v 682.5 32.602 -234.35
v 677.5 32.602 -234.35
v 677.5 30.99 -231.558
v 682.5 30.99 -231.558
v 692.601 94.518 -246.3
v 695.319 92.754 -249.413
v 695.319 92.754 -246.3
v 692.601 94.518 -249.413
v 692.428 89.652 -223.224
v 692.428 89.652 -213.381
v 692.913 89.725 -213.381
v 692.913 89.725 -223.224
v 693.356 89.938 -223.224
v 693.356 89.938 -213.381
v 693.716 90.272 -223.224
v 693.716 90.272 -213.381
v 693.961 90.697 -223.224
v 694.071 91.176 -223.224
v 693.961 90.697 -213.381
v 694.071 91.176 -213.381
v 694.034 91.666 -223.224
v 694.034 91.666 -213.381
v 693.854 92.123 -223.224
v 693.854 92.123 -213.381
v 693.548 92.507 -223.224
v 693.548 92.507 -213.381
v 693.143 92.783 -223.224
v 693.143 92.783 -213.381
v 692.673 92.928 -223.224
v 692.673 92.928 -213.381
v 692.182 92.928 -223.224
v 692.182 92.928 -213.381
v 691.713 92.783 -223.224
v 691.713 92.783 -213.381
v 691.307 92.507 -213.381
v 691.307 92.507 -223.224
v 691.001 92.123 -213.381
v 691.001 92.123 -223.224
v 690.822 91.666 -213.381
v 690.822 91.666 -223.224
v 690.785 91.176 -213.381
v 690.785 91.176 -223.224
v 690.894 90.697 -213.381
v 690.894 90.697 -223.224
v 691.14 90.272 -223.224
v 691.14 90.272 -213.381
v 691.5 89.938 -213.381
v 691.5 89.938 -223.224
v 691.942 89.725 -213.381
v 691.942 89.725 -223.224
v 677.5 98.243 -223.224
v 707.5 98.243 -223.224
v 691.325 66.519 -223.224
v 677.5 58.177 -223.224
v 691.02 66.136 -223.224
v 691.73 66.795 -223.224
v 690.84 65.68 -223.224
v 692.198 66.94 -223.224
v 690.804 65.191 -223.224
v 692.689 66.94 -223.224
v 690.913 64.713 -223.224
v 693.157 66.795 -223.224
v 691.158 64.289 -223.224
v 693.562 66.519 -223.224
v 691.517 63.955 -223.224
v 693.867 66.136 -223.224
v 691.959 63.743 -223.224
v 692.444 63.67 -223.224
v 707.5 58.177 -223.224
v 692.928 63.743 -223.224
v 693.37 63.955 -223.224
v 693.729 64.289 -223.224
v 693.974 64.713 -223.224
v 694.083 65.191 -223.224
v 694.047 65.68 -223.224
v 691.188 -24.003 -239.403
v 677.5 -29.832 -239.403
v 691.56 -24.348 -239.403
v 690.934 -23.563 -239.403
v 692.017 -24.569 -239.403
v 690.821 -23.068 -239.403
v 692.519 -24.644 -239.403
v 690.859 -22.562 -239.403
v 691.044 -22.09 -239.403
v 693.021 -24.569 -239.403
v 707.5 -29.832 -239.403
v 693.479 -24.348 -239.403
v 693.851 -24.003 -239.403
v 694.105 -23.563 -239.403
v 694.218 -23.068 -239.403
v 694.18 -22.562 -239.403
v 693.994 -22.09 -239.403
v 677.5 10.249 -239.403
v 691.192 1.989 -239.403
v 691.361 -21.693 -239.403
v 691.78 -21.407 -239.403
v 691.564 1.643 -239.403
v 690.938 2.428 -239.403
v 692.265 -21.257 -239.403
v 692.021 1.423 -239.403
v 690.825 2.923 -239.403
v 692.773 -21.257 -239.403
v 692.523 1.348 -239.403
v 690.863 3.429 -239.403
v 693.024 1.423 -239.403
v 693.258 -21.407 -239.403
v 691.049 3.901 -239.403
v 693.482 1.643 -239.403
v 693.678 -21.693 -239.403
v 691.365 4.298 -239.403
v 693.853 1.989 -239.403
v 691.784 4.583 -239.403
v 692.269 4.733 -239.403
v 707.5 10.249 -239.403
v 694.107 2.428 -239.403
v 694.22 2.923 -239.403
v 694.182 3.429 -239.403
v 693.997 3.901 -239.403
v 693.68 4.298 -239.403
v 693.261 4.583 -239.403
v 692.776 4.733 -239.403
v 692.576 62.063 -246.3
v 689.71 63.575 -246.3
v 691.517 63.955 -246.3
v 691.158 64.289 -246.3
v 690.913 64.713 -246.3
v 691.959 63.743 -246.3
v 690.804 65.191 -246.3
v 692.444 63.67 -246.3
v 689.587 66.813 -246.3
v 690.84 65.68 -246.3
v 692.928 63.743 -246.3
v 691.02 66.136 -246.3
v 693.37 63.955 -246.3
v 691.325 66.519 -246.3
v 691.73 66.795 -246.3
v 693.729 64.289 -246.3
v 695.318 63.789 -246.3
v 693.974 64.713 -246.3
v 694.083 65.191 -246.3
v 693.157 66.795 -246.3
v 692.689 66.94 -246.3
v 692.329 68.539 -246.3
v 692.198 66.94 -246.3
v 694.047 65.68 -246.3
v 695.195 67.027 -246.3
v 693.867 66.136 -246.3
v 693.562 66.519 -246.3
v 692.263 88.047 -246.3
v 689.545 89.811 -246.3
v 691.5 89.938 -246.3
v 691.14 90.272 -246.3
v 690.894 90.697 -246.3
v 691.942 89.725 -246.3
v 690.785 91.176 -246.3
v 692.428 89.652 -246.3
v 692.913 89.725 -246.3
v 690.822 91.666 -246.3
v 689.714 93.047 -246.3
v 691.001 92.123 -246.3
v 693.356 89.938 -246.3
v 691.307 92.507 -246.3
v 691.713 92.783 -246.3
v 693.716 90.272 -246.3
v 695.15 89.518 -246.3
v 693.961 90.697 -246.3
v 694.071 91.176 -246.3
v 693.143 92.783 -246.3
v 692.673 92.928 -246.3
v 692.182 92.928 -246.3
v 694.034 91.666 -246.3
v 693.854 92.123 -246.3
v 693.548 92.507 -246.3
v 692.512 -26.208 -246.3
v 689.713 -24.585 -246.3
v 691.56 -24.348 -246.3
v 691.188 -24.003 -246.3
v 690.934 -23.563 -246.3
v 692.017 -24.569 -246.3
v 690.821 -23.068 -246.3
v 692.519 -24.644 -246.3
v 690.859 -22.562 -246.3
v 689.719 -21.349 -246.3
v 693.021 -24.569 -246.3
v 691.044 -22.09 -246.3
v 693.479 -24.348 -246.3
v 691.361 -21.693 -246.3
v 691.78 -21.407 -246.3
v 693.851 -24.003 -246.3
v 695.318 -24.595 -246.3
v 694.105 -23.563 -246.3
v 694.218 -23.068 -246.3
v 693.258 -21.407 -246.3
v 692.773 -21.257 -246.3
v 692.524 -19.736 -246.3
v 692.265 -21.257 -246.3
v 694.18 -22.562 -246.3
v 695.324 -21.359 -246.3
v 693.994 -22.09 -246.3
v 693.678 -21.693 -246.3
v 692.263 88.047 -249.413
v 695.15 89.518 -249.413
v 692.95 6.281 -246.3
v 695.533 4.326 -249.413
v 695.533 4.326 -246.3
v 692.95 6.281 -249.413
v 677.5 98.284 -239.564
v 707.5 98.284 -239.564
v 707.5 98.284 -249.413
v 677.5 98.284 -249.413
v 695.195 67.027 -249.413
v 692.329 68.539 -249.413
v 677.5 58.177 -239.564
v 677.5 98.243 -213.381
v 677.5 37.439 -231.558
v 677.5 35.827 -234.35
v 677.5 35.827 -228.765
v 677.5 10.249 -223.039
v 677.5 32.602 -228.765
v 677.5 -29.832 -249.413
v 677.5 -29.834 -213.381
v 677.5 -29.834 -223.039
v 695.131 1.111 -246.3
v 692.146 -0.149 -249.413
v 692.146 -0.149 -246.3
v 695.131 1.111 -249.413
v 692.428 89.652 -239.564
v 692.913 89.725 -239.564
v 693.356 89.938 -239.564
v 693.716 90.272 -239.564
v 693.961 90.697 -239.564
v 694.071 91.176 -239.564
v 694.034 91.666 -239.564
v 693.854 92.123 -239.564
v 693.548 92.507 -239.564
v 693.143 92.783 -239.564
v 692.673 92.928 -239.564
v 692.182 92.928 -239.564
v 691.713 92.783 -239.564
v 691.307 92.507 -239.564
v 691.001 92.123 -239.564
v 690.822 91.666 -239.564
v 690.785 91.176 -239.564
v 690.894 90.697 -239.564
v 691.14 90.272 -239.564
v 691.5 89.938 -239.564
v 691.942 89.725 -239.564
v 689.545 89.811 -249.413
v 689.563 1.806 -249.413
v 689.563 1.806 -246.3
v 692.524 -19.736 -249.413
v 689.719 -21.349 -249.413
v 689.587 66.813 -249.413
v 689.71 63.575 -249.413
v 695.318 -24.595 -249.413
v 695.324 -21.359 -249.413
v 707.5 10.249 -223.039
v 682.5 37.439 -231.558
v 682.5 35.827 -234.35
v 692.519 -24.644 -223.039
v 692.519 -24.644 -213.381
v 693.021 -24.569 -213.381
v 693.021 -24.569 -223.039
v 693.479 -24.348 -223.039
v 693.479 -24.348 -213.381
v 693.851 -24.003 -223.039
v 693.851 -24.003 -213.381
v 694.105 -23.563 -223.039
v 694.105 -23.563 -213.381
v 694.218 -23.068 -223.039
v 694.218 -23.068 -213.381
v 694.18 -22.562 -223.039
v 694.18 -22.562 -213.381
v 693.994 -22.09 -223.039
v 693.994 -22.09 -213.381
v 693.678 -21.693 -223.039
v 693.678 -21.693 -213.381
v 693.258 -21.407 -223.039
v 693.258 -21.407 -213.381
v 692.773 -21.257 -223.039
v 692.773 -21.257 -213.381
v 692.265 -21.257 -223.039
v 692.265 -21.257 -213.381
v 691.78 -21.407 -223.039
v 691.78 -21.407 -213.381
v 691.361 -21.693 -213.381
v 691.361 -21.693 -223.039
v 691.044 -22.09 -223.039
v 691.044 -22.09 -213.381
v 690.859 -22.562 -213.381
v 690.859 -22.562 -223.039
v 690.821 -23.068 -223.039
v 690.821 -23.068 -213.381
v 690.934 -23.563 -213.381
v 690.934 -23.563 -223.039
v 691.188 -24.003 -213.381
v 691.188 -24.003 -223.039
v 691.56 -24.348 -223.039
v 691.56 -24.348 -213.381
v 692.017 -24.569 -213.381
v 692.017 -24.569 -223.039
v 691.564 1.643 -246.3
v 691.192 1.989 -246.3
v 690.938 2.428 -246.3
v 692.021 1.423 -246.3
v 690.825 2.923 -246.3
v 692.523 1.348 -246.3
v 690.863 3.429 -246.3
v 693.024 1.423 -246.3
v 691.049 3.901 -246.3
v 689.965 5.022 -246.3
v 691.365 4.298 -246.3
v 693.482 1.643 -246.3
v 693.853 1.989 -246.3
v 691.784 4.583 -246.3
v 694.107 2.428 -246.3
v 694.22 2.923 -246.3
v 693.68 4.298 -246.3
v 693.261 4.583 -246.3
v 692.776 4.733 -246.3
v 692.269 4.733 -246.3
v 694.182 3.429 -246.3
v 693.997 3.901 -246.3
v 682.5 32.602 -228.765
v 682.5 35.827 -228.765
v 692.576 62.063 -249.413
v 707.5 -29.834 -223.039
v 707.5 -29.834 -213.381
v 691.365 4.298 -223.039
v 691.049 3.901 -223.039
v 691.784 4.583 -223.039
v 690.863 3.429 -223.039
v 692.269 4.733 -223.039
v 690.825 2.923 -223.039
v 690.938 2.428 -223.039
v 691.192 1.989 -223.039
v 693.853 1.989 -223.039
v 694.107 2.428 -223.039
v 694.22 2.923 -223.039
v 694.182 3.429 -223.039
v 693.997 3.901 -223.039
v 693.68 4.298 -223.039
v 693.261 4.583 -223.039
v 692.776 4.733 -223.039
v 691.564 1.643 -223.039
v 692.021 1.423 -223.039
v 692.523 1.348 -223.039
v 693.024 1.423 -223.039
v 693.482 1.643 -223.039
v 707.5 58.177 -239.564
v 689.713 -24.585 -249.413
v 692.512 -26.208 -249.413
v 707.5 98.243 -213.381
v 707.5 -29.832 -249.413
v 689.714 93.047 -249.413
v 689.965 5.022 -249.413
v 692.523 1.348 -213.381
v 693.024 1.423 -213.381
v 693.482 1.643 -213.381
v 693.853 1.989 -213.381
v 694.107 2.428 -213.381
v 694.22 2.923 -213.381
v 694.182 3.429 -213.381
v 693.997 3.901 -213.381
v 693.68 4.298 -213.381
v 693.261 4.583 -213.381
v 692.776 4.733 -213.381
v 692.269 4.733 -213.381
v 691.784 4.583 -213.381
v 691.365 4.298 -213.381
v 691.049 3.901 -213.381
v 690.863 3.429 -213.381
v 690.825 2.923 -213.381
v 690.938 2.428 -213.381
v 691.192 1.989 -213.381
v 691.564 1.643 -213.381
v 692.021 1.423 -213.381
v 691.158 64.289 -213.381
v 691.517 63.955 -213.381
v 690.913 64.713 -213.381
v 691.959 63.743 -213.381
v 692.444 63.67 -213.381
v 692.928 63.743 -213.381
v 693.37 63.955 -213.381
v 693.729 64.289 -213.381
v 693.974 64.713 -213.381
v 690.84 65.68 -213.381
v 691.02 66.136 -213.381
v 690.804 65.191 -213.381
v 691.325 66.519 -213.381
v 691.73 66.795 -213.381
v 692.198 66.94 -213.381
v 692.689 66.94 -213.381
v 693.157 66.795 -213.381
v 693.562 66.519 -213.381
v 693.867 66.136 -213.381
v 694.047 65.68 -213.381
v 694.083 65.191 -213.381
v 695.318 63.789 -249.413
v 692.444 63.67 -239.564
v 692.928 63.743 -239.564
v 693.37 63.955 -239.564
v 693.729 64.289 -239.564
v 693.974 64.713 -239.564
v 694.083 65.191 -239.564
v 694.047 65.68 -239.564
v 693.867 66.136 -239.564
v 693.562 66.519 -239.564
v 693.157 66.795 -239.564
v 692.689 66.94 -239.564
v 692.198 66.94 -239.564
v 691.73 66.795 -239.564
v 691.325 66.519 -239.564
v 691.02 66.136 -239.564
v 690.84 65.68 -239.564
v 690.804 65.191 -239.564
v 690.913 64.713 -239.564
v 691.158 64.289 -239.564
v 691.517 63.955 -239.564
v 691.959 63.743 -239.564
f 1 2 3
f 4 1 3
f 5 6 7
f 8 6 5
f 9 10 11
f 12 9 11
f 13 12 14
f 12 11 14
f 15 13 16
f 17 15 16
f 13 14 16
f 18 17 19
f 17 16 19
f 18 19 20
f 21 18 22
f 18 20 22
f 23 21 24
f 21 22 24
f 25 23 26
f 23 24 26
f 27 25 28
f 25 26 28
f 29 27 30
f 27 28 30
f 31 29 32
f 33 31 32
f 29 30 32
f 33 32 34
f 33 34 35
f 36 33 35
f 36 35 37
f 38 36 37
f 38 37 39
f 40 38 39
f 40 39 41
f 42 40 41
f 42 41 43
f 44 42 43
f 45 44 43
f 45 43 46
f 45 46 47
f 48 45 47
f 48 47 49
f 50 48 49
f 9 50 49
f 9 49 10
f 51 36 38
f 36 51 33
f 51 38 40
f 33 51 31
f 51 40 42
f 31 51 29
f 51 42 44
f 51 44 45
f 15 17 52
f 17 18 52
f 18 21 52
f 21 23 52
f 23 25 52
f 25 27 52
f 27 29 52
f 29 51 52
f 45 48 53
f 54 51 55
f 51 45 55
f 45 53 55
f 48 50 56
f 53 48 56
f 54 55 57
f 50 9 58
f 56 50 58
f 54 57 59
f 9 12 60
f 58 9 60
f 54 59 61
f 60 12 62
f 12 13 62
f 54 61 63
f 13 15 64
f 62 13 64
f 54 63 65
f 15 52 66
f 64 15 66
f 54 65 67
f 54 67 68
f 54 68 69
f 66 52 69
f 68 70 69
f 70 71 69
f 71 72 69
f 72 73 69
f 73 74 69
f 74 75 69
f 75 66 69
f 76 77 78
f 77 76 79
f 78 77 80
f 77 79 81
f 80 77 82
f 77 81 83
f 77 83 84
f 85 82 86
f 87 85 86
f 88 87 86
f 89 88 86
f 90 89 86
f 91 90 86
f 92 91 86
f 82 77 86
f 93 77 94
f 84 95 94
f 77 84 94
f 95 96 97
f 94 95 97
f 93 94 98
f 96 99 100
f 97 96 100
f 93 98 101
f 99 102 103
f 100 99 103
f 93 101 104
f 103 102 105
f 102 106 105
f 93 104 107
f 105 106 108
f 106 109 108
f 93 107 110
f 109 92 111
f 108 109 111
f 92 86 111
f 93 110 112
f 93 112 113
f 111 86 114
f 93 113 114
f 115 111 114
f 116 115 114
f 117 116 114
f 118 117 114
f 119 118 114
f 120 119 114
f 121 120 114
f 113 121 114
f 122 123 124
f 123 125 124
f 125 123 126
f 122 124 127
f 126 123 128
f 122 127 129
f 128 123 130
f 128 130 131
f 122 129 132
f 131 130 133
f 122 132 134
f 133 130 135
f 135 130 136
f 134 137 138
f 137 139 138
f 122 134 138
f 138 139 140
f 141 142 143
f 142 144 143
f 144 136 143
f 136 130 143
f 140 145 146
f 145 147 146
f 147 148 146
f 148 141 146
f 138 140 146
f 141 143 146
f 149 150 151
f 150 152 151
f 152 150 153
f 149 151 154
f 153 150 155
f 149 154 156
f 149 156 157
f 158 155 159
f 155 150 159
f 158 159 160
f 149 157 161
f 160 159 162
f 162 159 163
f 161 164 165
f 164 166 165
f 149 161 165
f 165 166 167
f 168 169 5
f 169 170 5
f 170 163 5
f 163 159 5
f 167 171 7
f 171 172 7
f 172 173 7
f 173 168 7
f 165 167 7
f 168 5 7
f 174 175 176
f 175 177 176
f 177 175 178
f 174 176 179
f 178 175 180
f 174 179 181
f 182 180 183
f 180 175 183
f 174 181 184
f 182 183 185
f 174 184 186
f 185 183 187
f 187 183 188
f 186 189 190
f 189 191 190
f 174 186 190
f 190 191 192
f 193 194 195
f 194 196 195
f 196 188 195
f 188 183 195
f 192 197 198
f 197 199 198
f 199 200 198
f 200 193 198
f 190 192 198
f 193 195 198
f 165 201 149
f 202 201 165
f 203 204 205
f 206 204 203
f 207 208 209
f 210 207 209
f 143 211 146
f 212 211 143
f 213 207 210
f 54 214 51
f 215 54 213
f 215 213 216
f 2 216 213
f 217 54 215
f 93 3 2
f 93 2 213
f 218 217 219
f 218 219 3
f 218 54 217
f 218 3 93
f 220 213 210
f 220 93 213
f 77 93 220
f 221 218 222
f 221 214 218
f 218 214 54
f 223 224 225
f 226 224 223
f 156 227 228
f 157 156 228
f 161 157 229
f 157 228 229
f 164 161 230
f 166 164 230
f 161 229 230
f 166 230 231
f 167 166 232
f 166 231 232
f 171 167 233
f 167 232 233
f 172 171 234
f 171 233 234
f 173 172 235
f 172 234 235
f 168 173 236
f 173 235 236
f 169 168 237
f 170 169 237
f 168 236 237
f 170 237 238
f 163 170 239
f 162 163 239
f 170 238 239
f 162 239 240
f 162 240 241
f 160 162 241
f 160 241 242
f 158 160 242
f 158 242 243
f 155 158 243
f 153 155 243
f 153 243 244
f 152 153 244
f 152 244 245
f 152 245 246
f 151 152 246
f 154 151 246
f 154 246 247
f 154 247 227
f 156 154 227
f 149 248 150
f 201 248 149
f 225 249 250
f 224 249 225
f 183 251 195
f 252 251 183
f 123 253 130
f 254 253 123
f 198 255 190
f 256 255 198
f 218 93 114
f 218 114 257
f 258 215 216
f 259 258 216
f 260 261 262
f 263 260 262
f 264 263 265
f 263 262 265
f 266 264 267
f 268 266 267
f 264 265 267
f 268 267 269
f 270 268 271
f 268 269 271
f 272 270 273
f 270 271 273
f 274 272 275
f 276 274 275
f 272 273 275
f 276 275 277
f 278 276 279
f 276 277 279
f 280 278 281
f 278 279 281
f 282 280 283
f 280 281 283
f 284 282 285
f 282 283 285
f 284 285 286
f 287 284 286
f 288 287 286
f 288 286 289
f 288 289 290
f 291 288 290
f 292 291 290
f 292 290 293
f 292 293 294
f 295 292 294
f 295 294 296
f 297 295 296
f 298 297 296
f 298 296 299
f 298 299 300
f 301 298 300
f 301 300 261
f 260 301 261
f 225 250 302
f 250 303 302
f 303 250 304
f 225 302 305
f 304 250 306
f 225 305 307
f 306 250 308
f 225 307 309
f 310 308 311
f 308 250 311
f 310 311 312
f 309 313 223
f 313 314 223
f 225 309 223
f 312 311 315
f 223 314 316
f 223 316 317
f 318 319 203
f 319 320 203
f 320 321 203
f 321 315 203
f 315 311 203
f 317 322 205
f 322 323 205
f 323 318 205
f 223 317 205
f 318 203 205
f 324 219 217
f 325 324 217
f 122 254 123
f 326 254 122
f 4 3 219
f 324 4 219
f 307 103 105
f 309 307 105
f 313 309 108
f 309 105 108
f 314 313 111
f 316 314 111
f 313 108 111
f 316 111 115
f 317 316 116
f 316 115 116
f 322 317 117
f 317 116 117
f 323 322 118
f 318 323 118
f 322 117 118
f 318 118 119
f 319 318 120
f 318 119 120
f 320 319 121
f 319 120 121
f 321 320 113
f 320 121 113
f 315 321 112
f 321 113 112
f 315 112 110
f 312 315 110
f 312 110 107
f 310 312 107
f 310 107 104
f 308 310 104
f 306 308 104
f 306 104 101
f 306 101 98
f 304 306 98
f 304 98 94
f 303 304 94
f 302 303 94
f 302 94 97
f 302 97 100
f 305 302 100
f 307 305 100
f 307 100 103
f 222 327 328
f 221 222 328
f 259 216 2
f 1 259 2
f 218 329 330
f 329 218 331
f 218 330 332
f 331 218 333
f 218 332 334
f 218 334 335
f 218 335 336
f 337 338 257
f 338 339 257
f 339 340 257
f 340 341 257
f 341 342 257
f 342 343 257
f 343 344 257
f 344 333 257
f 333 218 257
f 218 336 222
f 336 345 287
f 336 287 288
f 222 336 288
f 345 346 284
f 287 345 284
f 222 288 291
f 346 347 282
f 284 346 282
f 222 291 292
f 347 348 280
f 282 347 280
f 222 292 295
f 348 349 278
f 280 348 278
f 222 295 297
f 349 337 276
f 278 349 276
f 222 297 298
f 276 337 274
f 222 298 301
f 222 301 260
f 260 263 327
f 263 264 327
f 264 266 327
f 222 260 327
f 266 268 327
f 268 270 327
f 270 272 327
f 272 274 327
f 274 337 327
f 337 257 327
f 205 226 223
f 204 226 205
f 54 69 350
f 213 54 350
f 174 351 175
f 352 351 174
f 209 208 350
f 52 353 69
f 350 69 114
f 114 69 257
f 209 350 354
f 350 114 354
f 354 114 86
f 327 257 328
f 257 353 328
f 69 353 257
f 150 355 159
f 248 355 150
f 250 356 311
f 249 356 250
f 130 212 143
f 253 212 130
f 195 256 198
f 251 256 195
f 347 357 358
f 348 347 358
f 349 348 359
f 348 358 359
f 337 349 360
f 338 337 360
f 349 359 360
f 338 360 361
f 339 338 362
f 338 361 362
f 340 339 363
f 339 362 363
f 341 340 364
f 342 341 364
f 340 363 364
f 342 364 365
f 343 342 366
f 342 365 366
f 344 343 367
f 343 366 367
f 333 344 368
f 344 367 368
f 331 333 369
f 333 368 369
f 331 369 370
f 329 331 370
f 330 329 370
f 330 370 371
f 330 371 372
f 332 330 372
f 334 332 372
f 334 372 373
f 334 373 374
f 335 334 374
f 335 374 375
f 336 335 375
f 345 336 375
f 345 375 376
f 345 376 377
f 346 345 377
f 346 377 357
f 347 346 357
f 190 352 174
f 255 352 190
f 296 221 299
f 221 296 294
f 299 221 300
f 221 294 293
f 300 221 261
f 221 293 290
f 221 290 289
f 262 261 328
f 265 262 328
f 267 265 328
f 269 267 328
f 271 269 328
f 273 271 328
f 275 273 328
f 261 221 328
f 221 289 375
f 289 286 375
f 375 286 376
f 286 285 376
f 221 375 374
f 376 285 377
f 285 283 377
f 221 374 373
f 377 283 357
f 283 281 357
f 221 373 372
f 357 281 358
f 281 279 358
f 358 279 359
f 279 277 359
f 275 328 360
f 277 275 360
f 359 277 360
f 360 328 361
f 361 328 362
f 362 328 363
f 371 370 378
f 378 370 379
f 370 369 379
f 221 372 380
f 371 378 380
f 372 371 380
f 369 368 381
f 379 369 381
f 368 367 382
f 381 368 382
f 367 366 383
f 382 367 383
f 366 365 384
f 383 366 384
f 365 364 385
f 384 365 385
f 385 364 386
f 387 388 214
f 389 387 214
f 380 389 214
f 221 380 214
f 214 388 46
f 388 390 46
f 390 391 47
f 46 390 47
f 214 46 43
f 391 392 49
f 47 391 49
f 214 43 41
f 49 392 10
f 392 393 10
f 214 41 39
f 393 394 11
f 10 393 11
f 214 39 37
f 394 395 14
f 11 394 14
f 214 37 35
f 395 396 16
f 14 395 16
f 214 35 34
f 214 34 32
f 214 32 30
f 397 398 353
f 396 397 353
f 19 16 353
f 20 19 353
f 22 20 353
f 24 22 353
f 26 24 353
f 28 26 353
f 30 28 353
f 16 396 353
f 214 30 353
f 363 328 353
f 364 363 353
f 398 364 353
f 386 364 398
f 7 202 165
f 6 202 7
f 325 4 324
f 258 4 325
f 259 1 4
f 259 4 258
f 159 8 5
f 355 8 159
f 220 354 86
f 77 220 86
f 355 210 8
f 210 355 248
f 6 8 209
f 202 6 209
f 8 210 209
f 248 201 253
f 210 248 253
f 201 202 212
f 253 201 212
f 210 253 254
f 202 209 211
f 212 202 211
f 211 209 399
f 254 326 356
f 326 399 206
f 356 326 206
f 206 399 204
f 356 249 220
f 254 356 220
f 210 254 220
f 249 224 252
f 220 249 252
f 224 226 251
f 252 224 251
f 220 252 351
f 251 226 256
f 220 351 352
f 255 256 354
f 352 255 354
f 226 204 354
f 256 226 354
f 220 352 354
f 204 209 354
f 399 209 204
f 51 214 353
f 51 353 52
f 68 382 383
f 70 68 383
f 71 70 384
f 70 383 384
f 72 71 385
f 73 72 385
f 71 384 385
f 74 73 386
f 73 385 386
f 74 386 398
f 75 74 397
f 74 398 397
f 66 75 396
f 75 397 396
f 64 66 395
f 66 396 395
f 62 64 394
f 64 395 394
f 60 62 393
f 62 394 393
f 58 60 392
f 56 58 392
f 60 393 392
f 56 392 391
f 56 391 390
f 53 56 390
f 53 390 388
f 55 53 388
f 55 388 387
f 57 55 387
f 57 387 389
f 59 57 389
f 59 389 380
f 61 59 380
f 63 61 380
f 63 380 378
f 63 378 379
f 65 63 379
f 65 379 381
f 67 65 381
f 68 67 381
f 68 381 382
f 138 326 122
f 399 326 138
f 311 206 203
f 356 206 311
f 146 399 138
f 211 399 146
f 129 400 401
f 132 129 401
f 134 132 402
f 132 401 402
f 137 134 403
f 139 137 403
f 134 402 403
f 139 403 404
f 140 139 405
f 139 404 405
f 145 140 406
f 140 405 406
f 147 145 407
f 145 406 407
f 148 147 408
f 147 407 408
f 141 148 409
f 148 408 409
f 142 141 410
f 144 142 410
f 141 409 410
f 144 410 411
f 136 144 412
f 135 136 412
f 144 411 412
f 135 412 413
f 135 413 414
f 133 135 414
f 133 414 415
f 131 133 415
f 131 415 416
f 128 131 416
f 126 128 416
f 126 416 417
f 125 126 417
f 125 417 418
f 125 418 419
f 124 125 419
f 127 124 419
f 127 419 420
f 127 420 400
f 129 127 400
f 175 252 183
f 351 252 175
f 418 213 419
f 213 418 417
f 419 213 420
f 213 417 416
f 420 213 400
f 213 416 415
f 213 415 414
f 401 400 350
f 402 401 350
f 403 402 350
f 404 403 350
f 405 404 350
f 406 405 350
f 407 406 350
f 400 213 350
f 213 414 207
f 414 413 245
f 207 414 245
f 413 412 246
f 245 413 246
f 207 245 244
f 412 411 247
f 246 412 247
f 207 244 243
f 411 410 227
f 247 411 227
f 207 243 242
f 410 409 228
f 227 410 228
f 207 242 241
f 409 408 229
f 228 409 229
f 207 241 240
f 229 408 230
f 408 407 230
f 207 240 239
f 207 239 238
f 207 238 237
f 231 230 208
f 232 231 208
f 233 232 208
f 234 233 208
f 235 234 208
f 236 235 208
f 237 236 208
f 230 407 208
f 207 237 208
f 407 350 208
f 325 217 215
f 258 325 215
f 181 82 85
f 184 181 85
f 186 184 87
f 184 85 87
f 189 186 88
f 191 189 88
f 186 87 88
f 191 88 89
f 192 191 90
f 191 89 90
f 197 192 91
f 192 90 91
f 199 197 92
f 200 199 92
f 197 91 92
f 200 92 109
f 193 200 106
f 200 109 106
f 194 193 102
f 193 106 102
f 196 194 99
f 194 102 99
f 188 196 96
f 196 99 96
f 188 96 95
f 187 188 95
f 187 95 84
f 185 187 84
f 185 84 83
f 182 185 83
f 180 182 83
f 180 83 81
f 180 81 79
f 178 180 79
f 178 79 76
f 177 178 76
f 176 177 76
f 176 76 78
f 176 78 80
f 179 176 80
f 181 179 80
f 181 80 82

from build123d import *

# Parameters (mm, degrees)
PAD_DEPTH            = 30
SKETCH001_R          = 1.647318
SKETCH001_R_2        = 1.644279
SKETCH001_R_3        = 1.702169
SKETCH001_R_4        = 1.703214
POCKET_DEPTH         = 600
POCKET_DEPTH_BACK    = -600
POCKET001_DEPTH      = 3.3
POCKET001_DEPTH_BACK = -3.3
SKETCH005_R          = 1.5
POCKET006_DEPTH      = 5
POCKET006_FACE59_R   = 1.5
POCKET007_DEPTH      = 5


with BuildPart() as part:
    # Sketch → Pad (new body)
    with BuildSketch(Plane.YZ.offset(707.5)):
        Polygon((-29.833706, -213.381088), (98.242805, -213.381088), (98.242805, -223.224411), (58.176593, -223.224411), (58.176593, -239.563995), (98.283882, -239.563995), (98.283882, -249.413437), (-29.832484, -249.413437), (-29.832484, -239.402665), (10.249295, -239.402665), (10.249295, -223.039155), (-29.833706, -223.039155), align=None)
    extrude(amount=-PAD_DEPTH)

    # Sketch001 (on Face1 of Pad) → Pocket (cut, two sides)
    with BuildSketch(Plane(origin=(707.5, 0, -213.381088), x_dir=(0, -1, 0), z_dir=(0, 0, 1))) as pocket_sk:
        with Locations((-91.299301, -15.072129)):
            Circle(SKETCH001_R)
        with Locations((-65.313827, -15.0565)):
            Circle(SKETCH001_R_2)
        with Locations((-3.04988, -14.977353)):
            Circle(SKETCH001_R_3)
        with Locations((22.941161, -14.98072)):
            Circle(SKETCH001_R_4)
    extrude(amount=-POCKET_DEPTH, mode=Mode.SUBTRACT)
    extrude(pocket_sk.sketch, amount=-POCKET_DEPTH_BACK, mode=Mode.SUBTRACT)

    # Sketch002 → Pocket001 (cut, two sides)
    with BuildSketch(Plane.XY.offset(-249.6)) as pocket001_sk:
        Polygon((689.718567, -21.348757), (689.712699, -24.584869), (692.51232, -26.208007), (695.317809, -24.595033), (695.323677, -21.358921), (692.524056, -19.735783), align=None)
        Polygon((689.964521, 5.02151), (689.5629, 1.806498), (692.146371, -0.148822), (695.131463, 1.11087), (695.533085, 4.325882), (692.949613, 6.281202), align=None)
        Polygon((689.710385, 63.575304), (692.575997, 62.063394), (695.318155, 63.789132), (695.194701, 67.026779), (692.32909, 68.538689), (689.586932, 66.812951), align=None)
        Polygon((689.714374, 93.046585), (689.545318, 89.810999), (692.262889, 88.046798), (695.149518, 89.518184), (695.318574, 92.75377), (692.601003, 94.517971), align=None)
    extrude(amount=-POCKET001_DEPTH, mode=Mode.SUBTRACT)
    extrude(pocket001_sk.sketch, amount=-POCKET001_DEPTH_BACK, mode=Mode.SUBTRACT)

    # Sketch005 (on Face4 of Pocket001) → Pocket006 (cut)
    with BuildSketch(Plane(origin=(677.5, 0, 0), x_dir=(0, 1, 0), z_dir=(-1, 0, 0))):
        Polygon((37.439188, 231.557562), (35.826938, 234.350061), (32.602438, 234.350061), (30.990188, 231.557562), (32.602438, 228.765063), (35.826938, 228.765063), align=None)
        with Locations((34.214688, 231.557562)):
            Circle(SKETCH005_R, mode=Mode.SUBTRACT)
    extrude(amount=-POCKET006_DEPTH, mode=Mode.SUBTRACT)

    # Pocket006 Face59 → Pocket007 (cut)
    with BuildSketch(Plane(origin=(677.5, 34.214688, -231.557562), x_dir=(0, 1, 0), z_dir=(-1, 0, 0))):
        Circle(POCKET006_FACE59_R)
    extrude(amount=-POCKET007_DEPTH, mode=Mode.SUBTRACT)


solid = part.part
